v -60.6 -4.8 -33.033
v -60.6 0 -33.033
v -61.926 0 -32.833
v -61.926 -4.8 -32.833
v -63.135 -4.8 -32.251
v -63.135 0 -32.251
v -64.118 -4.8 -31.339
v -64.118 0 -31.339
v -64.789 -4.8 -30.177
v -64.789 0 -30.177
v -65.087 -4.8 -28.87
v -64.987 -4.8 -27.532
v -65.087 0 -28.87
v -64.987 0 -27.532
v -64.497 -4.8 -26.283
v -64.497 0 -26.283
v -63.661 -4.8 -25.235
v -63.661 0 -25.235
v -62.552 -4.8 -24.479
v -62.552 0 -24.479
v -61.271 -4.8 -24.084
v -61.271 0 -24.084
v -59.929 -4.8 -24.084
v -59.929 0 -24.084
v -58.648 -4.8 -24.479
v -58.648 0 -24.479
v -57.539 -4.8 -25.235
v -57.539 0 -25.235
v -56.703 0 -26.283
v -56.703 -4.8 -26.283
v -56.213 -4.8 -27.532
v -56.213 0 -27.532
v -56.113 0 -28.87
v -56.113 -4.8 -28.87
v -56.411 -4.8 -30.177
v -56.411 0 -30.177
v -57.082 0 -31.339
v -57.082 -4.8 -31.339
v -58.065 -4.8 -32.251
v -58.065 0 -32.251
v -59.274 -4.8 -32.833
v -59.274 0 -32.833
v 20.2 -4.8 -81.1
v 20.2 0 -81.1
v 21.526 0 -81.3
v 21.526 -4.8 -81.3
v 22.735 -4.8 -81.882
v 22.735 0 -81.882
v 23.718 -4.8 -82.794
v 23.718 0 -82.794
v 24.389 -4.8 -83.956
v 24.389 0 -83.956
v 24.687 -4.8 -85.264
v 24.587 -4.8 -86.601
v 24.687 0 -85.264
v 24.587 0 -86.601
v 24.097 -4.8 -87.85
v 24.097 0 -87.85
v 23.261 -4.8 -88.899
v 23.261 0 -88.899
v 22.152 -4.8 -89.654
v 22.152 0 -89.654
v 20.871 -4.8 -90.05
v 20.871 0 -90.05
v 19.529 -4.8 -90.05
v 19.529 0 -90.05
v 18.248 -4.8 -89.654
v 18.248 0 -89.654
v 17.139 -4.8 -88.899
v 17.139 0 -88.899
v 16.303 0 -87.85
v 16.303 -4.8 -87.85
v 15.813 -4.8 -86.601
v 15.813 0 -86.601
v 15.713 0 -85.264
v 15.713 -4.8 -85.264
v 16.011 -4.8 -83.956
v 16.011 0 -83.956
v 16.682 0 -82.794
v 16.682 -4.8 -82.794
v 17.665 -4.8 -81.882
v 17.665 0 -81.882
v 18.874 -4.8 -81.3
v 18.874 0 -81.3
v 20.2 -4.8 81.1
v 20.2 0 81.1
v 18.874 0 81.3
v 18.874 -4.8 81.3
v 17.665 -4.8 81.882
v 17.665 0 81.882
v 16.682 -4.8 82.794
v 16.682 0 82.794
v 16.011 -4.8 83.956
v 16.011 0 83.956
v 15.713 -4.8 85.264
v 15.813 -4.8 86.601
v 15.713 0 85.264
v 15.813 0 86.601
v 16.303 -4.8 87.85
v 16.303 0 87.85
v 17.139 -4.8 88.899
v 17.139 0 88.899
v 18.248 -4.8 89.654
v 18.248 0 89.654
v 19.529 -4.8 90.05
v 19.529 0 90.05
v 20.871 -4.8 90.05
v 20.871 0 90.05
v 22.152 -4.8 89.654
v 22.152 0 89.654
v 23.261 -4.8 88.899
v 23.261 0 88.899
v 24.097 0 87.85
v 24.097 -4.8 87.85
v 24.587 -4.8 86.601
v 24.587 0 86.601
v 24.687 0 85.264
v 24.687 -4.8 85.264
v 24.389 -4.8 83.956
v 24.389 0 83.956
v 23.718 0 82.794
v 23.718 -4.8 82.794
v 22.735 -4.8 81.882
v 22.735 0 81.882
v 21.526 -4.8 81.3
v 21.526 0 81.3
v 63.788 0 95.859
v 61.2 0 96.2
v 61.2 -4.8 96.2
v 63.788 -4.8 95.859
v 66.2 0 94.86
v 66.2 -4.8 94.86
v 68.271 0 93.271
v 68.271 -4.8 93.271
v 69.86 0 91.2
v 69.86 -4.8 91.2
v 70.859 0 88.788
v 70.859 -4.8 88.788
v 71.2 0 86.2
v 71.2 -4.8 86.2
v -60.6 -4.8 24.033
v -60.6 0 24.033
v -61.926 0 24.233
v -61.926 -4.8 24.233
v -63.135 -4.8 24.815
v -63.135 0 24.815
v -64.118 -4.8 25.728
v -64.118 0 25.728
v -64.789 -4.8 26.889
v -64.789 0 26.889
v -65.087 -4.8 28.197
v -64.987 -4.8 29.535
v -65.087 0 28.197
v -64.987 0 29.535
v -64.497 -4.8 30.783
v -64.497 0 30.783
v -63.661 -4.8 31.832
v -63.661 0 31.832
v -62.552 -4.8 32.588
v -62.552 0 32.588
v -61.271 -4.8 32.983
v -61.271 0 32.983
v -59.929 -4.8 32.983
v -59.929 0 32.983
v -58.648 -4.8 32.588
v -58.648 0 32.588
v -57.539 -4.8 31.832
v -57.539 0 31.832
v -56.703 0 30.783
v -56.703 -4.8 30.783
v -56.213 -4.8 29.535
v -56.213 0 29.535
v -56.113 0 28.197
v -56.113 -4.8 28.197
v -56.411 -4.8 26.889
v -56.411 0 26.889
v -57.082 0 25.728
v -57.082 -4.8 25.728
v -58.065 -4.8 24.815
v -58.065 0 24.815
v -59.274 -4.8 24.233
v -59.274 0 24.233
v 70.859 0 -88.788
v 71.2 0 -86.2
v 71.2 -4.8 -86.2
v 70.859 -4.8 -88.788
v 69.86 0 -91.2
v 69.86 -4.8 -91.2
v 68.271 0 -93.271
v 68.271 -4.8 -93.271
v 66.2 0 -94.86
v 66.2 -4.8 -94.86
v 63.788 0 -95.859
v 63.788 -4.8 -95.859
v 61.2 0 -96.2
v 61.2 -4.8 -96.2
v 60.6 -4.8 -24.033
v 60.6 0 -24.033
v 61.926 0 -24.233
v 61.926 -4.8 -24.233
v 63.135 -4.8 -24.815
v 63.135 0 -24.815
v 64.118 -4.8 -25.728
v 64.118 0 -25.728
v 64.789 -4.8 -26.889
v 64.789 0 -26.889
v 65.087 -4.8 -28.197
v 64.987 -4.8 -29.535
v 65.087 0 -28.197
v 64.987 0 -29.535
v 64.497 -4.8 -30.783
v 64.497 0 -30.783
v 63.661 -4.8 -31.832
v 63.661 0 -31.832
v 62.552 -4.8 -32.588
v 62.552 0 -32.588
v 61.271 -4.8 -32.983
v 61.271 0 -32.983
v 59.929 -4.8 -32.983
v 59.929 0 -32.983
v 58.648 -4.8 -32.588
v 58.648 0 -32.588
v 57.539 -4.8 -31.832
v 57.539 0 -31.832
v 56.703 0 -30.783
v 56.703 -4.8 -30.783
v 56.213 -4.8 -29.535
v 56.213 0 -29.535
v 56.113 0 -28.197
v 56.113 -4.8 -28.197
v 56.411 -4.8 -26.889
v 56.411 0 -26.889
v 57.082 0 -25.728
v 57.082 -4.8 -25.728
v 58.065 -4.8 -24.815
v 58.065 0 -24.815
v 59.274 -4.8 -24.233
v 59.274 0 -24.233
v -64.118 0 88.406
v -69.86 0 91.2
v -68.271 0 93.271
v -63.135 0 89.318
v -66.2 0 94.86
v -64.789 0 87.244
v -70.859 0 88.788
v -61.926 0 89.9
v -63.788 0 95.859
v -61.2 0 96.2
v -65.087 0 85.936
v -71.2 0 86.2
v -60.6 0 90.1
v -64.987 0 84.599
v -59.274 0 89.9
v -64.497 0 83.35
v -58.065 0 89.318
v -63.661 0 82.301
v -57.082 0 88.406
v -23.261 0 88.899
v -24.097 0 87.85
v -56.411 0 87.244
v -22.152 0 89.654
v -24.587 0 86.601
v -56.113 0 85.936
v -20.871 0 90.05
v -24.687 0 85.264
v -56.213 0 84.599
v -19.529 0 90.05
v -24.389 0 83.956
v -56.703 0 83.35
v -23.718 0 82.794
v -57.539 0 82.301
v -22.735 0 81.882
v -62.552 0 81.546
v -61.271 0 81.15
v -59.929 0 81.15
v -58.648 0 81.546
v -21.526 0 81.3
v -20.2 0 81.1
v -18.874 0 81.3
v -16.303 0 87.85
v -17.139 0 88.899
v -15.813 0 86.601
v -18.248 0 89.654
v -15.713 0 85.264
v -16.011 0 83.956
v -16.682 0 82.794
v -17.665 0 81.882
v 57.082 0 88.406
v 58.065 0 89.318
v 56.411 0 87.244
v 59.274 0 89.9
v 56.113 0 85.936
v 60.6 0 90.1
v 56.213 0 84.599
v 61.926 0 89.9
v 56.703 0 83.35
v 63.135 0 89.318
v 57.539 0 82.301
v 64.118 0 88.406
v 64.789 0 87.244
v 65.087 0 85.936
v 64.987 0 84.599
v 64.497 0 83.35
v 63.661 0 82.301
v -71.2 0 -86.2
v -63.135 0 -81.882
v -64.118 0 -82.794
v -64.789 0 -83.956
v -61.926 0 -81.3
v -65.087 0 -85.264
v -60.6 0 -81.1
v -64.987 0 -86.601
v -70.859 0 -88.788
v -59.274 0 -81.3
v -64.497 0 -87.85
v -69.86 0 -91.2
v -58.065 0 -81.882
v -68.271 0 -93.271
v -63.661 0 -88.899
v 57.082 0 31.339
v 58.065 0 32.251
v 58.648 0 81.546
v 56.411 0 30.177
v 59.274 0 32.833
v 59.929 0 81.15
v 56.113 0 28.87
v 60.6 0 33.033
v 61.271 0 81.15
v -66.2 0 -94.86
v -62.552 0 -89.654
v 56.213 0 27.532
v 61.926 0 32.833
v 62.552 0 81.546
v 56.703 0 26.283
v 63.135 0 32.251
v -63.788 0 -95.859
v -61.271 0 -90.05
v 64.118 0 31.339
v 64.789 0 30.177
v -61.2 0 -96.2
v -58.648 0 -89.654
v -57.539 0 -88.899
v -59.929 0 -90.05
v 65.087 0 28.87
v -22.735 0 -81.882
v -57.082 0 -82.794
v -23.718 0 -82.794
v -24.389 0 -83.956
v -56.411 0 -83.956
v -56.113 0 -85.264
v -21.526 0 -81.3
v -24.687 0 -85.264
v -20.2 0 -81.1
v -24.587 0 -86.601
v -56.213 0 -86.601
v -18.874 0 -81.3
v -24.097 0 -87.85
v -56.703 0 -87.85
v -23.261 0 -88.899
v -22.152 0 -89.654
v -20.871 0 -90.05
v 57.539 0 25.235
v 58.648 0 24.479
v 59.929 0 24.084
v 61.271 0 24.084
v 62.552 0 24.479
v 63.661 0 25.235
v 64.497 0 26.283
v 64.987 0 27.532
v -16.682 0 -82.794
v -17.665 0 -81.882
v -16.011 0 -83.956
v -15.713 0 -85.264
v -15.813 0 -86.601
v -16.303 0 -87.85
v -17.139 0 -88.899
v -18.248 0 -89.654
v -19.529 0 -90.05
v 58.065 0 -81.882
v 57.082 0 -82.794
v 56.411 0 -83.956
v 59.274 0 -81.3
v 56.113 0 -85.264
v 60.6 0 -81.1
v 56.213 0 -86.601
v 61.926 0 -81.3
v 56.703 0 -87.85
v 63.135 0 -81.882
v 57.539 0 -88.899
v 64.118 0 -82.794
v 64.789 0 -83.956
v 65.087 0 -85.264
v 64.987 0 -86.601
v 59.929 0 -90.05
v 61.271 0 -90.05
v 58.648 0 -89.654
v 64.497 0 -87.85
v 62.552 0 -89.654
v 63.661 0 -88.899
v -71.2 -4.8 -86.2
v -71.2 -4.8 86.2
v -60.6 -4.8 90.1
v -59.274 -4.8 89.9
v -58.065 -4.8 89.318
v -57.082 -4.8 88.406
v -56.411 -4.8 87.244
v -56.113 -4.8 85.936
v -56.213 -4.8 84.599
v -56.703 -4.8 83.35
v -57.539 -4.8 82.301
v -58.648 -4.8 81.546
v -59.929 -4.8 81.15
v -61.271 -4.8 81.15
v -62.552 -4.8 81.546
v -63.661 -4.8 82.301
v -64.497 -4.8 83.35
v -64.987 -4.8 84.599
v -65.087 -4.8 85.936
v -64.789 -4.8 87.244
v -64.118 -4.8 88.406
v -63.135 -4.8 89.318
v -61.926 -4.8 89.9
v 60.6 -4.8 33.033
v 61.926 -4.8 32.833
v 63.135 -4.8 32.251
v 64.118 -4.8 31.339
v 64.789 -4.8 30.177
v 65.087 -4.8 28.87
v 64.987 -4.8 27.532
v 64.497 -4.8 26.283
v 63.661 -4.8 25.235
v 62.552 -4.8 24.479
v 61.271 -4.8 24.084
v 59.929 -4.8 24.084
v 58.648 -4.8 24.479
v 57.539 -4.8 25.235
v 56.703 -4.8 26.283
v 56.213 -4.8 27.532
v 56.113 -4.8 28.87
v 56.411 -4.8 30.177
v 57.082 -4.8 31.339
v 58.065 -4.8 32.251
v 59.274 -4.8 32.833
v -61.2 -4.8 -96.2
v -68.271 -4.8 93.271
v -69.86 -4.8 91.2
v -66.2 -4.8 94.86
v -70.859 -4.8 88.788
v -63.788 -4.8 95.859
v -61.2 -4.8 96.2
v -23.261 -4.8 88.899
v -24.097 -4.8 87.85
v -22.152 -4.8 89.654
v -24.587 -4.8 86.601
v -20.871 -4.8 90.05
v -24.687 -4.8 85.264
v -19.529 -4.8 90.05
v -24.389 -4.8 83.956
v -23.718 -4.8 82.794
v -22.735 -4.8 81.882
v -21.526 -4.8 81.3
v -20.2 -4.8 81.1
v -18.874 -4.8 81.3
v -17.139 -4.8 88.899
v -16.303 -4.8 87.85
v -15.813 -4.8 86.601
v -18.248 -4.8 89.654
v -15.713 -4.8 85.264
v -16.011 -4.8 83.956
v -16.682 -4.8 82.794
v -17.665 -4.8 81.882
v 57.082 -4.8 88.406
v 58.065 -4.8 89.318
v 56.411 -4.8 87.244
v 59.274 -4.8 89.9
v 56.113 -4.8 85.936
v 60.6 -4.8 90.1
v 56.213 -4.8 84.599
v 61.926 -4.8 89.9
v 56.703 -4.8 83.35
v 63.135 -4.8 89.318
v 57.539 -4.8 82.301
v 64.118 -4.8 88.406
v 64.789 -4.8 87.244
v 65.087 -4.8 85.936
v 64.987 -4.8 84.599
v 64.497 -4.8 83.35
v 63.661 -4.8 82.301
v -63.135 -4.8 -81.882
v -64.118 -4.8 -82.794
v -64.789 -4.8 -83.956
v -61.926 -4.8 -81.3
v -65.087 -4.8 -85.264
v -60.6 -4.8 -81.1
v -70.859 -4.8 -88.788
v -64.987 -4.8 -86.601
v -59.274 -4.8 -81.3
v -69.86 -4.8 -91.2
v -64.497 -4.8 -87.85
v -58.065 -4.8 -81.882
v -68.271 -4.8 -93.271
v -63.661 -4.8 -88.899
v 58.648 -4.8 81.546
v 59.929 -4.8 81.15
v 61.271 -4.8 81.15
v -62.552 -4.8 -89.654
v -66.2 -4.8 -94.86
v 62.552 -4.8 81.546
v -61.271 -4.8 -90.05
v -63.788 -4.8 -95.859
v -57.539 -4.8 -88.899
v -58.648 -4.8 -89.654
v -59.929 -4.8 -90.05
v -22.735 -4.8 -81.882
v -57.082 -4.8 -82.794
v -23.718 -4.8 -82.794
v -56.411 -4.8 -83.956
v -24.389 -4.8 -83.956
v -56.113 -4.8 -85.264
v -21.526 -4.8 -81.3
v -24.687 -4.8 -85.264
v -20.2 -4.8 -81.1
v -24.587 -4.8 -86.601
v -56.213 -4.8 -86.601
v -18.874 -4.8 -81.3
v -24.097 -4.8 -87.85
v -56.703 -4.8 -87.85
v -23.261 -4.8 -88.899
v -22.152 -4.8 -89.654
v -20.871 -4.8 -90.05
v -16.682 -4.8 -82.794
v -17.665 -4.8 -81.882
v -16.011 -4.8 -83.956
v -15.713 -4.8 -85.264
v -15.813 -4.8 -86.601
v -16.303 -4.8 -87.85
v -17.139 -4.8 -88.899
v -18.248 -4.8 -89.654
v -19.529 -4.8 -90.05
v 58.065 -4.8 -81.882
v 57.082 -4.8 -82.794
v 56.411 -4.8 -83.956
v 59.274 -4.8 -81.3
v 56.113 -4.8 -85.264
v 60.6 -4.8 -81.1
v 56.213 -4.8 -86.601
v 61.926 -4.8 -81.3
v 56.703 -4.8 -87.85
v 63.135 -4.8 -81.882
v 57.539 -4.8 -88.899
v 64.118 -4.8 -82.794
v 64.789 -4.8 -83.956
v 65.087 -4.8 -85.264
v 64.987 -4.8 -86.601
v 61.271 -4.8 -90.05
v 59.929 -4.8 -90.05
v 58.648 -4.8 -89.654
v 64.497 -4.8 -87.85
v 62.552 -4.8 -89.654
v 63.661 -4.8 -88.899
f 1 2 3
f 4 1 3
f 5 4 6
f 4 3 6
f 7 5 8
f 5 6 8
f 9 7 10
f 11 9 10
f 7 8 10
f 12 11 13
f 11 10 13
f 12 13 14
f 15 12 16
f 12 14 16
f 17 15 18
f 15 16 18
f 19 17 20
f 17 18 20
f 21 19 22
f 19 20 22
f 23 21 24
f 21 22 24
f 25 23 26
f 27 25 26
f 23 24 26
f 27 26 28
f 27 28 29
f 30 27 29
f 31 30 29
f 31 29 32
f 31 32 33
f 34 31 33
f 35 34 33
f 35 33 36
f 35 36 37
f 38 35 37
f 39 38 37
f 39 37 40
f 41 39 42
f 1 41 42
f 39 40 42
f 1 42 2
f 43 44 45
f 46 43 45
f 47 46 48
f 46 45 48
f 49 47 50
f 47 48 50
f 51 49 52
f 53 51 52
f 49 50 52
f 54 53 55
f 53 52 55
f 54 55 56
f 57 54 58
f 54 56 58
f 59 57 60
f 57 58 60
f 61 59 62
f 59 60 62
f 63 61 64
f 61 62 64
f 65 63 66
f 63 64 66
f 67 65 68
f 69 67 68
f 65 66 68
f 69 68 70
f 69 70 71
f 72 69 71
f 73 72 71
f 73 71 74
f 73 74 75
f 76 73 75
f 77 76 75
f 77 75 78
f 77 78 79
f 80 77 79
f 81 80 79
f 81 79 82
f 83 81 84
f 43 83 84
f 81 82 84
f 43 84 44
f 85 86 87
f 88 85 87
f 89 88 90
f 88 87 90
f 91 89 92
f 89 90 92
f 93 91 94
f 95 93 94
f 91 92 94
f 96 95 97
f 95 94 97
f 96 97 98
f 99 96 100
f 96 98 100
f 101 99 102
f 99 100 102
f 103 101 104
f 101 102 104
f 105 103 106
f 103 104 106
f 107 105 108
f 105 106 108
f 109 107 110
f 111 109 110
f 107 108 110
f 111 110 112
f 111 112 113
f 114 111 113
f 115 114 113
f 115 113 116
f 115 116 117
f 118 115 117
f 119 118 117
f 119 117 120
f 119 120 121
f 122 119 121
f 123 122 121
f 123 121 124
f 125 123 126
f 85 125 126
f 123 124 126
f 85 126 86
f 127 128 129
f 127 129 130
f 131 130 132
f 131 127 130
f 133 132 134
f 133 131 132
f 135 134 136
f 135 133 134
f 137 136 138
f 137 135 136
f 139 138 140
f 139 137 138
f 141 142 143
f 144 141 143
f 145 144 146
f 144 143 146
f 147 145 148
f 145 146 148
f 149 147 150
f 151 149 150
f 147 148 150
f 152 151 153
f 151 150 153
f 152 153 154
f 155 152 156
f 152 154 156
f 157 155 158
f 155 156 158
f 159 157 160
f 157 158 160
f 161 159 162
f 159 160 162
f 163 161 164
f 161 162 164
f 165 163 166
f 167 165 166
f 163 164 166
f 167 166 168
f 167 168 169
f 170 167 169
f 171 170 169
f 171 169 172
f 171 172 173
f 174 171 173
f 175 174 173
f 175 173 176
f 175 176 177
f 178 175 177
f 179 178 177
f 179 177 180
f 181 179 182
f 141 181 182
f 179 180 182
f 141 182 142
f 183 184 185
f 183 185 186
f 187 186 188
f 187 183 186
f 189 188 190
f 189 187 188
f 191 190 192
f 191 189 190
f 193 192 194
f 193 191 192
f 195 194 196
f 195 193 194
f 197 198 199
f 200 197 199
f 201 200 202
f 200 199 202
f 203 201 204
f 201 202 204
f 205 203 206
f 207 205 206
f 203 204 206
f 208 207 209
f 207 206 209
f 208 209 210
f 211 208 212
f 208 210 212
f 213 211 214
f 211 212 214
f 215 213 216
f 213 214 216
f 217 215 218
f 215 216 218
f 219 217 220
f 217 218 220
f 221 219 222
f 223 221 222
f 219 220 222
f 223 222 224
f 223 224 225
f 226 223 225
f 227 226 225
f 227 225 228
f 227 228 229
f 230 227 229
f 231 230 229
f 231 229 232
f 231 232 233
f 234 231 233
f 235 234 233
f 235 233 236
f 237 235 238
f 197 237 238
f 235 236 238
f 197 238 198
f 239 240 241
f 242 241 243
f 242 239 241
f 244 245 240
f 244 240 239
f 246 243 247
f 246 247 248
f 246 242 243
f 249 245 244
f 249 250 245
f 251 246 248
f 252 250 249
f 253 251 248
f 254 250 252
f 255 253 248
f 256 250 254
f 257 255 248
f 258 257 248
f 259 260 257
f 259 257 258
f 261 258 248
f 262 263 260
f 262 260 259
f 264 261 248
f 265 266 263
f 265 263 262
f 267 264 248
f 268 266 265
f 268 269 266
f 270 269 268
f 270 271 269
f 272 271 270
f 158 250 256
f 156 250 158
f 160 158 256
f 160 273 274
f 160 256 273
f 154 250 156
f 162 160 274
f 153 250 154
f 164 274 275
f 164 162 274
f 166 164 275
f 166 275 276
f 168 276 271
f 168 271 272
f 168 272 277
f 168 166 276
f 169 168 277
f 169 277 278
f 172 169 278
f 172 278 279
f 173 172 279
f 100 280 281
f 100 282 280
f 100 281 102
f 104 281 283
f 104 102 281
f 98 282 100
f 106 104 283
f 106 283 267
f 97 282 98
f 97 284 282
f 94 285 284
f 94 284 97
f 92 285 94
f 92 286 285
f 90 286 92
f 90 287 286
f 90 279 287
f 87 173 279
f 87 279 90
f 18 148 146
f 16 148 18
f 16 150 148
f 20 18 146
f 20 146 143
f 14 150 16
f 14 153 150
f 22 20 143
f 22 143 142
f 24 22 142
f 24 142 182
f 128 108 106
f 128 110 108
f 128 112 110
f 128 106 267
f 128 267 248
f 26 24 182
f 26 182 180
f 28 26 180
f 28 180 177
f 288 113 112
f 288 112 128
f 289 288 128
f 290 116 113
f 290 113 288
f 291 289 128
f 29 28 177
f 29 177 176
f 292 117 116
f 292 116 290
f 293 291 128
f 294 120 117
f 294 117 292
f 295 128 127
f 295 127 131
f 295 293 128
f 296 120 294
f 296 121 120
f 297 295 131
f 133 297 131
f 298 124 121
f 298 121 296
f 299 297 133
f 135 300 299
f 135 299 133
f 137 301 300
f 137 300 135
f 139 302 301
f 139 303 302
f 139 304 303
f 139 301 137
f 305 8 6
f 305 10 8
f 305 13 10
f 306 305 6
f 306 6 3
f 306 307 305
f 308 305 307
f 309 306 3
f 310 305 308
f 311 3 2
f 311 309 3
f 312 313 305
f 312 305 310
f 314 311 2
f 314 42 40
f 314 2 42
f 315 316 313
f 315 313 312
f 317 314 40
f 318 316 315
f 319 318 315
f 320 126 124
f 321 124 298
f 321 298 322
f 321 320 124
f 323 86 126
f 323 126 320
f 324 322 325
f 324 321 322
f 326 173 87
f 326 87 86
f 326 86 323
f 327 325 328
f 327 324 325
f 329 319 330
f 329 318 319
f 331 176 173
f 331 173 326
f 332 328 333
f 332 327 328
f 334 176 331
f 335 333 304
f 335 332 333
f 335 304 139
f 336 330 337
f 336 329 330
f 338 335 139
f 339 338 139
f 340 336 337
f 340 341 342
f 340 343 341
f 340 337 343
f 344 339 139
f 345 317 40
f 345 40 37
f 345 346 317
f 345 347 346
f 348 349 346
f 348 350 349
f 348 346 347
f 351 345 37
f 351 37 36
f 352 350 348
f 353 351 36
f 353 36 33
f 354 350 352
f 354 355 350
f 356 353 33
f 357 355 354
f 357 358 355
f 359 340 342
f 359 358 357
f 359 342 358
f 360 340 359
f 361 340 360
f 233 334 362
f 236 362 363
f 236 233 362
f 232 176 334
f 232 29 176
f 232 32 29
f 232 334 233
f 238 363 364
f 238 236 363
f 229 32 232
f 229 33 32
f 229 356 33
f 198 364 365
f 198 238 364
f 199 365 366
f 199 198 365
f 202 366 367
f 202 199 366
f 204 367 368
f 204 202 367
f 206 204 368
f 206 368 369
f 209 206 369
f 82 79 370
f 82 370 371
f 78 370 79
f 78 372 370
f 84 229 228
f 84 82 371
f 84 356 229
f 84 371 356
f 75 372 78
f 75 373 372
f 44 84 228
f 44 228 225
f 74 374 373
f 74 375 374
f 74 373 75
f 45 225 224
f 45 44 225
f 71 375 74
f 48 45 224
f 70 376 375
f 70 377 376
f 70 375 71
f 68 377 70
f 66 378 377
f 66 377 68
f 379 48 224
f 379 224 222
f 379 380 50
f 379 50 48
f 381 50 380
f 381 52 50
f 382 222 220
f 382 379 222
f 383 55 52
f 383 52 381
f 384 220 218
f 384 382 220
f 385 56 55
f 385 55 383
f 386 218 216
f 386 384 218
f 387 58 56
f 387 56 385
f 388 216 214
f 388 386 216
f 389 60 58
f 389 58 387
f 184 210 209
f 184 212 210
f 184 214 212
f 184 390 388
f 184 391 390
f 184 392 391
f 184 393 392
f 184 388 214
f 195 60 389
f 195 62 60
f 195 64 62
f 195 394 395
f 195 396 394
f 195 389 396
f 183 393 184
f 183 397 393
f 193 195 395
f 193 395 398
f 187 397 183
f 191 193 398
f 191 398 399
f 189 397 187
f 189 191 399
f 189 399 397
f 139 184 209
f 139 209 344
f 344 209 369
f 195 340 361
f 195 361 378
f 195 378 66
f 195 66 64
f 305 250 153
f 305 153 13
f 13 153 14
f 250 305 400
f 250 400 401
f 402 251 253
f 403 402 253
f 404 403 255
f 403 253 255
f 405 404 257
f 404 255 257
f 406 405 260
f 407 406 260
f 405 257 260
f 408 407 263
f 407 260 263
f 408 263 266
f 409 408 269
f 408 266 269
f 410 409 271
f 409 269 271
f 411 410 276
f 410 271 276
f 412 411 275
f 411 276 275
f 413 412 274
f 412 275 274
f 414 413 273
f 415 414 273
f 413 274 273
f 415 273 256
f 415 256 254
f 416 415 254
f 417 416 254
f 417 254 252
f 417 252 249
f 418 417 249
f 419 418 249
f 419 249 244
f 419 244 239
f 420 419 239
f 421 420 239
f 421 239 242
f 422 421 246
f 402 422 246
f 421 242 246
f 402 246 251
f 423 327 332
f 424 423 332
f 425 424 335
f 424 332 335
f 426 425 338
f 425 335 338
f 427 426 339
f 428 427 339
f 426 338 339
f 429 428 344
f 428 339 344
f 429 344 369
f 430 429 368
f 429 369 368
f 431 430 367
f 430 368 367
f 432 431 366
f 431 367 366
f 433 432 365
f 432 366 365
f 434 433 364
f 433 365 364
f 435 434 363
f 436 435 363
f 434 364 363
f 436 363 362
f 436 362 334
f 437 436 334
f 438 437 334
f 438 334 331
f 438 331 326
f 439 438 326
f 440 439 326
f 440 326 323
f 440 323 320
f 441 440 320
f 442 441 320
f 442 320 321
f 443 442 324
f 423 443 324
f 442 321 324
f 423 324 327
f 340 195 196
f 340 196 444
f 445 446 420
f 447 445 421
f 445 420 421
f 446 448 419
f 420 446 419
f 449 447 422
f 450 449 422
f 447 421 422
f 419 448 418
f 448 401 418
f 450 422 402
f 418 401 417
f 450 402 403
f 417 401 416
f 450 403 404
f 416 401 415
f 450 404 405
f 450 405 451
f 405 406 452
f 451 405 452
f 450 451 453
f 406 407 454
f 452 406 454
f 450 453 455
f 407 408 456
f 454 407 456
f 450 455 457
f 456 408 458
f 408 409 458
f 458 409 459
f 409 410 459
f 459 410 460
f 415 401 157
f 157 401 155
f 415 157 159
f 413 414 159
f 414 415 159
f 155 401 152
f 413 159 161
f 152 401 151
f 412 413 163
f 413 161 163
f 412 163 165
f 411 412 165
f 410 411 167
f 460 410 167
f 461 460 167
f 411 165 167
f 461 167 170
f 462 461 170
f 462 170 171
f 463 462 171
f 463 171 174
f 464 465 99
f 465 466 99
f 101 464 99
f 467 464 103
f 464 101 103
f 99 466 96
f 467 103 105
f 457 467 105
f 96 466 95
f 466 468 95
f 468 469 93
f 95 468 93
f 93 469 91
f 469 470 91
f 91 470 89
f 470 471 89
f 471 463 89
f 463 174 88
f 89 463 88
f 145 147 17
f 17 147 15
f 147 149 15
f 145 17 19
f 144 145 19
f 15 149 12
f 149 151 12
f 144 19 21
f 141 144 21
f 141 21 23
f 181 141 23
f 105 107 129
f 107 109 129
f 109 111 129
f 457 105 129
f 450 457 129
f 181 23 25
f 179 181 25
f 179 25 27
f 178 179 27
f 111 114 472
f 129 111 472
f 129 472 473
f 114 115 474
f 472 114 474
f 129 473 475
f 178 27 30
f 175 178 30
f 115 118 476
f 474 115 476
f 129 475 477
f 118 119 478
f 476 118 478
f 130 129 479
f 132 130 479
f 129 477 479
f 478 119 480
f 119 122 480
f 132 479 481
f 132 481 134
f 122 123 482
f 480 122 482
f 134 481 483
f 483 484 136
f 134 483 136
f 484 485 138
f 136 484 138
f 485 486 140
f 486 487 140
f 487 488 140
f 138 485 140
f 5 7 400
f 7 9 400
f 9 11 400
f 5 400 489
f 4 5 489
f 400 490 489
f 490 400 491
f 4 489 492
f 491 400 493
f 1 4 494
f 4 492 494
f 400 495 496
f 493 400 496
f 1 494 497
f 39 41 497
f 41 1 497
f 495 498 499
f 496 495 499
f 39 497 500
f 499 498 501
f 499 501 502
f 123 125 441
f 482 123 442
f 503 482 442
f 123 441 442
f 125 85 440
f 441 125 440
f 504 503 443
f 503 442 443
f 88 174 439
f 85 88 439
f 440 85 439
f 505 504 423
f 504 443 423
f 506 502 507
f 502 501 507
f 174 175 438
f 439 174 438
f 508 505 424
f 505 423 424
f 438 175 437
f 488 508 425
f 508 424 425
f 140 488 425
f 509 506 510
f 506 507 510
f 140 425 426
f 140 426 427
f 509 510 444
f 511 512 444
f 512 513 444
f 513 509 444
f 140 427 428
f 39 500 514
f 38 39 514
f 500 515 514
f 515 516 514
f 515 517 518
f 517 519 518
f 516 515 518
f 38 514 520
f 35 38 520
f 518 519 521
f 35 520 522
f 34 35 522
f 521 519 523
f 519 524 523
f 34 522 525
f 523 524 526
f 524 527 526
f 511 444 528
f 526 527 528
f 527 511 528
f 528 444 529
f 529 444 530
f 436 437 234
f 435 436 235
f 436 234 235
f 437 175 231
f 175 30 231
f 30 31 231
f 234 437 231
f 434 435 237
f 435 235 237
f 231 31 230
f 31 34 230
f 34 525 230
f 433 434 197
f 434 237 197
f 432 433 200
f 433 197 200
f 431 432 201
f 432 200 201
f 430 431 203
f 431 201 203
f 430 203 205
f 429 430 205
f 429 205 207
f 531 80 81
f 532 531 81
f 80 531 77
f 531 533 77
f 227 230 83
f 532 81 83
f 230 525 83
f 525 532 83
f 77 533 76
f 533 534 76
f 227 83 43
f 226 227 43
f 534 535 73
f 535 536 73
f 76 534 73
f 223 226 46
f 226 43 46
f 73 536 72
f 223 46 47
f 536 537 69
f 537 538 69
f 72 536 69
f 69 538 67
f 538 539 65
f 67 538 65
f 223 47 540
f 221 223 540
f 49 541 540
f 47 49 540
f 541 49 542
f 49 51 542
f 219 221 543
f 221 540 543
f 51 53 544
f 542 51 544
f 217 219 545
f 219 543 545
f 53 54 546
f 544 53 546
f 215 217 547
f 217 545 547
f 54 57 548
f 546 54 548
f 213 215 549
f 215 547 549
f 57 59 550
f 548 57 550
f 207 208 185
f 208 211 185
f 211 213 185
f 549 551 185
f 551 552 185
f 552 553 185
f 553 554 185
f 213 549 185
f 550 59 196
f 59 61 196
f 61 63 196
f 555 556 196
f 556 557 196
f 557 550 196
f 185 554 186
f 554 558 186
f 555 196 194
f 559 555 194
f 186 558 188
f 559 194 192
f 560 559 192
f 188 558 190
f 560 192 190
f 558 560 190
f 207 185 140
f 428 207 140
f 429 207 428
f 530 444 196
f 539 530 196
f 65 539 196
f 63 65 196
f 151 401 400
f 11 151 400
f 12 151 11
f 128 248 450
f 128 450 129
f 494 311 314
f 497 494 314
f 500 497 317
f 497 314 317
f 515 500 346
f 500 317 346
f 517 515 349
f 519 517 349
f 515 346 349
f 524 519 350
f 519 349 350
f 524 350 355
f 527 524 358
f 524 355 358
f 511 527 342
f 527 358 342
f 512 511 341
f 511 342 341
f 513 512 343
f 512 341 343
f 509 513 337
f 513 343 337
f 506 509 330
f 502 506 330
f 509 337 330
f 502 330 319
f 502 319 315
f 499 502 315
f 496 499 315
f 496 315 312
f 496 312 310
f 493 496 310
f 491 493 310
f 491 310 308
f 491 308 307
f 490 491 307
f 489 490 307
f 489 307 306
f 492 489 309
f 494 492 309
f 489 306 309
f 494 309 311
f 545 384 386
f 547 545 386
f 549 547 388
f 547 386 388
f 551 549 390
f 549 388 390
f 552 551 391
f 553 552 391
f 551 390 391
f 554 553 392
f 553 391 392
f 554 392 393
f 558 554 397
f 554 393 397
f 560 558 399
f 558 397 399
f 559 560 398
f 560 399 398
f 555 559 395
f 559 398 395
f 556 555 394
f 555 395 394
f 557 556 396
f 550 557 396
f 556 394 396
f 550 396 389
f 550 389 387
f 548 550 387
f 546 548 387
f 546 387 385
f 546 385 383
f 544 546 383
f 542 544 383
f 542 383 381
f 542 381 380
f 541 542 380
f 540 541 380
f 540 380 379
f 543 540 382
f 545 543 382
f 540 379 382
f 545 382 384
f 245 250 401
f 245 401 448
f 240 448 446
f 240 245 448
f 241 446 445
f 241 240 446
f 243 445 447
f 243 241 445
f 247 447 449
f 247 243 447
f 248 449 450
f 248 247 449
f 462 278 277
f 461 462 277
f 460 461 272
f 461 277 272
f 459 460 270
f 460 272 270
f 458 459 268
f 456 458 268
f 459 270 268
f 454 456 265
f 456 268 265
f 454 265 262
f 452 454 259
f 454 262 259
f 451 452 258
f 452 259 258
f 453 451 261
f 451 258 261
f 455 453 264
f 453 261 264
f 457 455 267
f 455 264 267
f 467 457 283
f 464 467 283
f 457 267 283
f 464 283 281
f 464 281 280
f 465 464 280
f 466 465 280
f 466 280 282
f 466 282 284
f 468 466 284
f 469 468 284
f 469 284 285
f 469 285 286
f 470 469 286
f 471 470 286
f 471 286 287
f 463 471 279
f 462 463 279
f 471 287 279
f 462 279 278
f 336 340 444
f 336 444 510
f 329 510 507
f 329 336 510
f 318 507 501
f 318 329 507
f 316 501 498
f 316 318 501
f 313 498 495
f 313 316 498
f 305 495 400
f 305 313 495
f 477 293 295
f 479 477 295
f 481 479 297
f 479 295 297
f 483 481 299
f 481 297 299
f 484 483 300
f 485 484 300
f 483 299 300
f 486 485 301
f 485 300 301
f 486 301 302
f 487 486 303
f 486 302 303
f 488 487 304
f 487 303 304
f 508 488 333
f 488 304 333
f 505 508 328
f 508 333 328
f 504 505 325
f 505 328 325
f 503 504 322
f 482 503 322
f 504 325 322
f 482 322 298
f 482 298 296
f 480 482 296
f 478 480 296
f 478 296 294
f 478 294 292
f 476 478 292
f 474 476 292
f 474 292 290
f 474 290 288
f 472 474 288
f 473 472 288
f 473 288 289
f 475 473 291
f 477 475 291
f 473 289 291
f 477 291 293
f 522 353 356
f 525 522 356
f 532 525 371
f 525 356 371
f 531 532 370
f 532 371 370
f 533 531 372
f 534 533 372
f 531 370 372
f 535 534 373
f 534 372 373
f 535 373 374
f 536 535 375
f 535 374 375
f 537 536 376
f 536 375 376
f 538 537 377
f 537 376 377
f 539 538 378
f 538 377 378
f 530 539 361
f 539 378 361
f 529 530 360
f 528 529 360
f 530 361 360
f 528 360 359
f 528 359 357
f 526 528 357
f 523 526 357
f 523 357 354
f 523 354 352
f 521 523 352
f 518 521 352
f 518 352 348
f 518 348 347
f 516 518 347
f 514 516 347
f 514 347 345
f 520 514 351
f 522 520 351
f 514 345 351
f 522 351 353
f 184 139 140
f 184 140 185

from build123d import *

# Parameters (mm, degrees)
ESBO_O1_R          = 4.5
FLANGE_BASE1_DEPTH = 4.8


# Sheet-metal steps are written as plain solids
with BuildPart() as part:
    # Esboço1 → Flange-base1 (new body)
    with BuildSketch(Plane(origin=(0, 0, 0), x_dir=(1, 0, 0), z_dir=(0, 1, 0))):
        with BuildLine():
            Line((-61.2, -96.2), (61.2, -96.2))
            ThreePointArc((61.2, -96.2), (68.271067812, -93.271067812), (71.2, -86.2))
            Line((71.2, -86.2), (71.2, 86.2))
            ThreePointArc((71.2, 86.2), (68.271067812, 93.271067812), (61.2, 96.2))
            Line((61.2, 96.2), (-61.2, 96.2))
            ThreePointArc((-61.2, 96.2), (-68.271067812, 93.271067812), (-71.2, 86.2))
            Line((-71.2, 86.2), (-71.2, -86.2))
            ThreePointArc((-71.2, -86.2), (-68.271067812, -93.271067812), (-61.2, -96.2))
        make_face()
        with Locations(Location((-60.6, 85.6, 0), (0, 0, 270))):
            Circle(ESBO_O1_R, mode=Mode.SUBTRACT)
        with Locations(Location((60.6, 85.6, 0), (0, 0, 270))):
            Circle(ESBO_O1_R, mode=Mode.SUBTRACT)
        with Locations(Location((-60.6, -85.6, 0), (0, 0, 270))):
            Circle(ESBO_O1_R, mode=Mode.SUBTRACT)
        with Locations(Location((60.6, -85.6, 0), (0, 0, 270))):
            Circle(ESBO_O1_R, mode=Mode.SUBTRACT)
        with Locations(Location((-20.2, 85.6, 0), (0, 0, 270))):
            Circle(ESBO_O1_R, mode=Mode.SUBTRACT)
        with Locations(Location((20.2, 85.6, 0), (0, 0, 270))):
            Circle(ESBO_O1_R, mode=Mode.SUBTRACT)
        with Locations(Location((60.6, 28.533333333, 0), (0, 0, 270))):
            Circle(ESBO_O1_R, mode=Mode.SUBTRACT)
        with Locations(Location((60.6, -28.533333333, 0), (0, 0, 270))):
            Circle(ESBO_O1_R, mode=Mode.SUBTRACT)
        with Locations(Location((20.2, -85.6, 0), (0, 0, 90))):
            Circle(ESBO_O1_R, mode=Mode.SUBTRACT)
        with Locations(Location((-20.2, -85.6, 0), (0, 0, 90))):
            Circle(ESBO_O1_R, mode=Mode.SUBTRACT)
        with Locations(Location((-60.6, -28.533333333, 0), (0, 0, 90))):
            Circle(ESBO_O1_R, mode=Mode.SUBTRACT)
        with Locations(Location((-60.6, 28.533333333, 0), (0, 0, 90))):
            Circle(ESBO_O1_R, mode=Mode.SUBTRACT)
    extrude(amount=-FLANGE_BASE1_DEPTH)


solid = part.part
